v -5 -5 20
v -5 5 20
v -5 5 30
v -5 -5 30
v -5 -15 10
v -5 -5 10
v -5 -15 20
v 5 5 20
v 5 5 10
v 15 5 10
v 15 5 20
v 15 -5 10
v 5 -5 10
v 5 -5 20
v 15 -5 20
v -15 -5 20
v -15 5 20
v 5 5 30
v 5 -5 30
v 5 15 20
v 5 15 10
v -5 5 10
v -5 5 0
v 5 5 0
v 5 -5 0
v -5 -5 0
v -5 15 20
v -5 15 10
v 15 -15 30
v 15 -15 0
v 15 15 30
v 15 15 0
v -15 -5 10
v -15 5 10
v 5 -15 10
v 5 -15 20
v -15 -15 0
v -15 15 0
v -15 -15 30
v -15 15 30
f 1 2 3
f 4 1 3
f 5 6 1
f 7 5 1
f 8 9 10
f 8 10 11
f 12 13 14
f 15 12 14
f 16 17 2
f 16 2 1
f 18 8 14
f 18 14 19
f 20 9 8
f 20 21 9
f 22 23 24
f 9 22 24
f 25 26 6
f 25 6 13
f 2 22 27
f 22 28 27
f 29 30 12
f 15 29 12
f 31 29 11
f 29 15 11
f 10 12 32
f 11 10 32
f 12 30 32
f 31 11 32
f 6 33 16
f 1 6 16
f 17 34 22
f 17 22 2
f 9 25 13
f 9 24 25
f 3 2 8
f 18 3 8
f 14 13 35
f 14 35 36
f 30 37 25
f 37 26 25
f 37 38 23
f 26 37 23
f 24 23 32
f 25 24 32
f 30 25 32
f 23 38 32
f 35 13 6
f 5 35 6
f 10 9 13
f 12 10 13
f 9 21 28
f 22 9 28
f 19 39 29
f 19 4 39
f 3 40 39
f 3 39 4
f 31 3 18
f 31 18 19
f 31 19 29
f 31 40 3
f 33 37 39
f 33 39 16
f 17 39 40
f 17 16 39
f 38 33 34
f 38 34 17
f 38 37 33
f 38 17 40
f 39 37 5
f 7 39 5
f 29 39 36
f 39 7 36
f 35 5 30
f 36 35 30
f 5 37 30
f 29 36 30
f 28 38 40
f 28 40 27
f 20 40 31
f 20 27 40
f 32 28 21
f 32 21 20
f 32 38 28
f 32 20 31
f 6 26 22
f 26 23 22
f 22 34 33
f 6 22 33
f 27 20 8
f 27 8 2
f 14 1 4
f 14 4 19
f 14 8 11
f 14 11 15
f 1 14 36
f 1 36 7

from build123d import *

# Parameters (mm, degrees)
F1_W     = 30
F1_H     = 30
F1_W_2   = 10
F1_H_2   = 10
F2_DEPTH = 30
F3_W     = 10
F3_H     = 10
F4_DEPTH = 30
F5_W     = 10
F5_H     = 10
F6_DEPTH = 30


with BuildPart() as f2:
    # F1 (on Top) → F2 (new body)
    with BuildSketch(Plane.XY):
        Rectangle(F1_W, F1_H)
        Rectangle(F1_W_2, F1_H_2, mode=Mode.SUBTRACT)
    extrude(amount=F2_DEPTH)

    # F3 (on face) → F4 (cut, through all)
    with BuildSketch(Plane(origin=(0, 15, 0), x_dir=(-1, 0, 0), z_dir=(0, 1, 0))):
        with Locations((0, 15)):
            Rectangle(F3_W, F3_H)
    extrude(amount=-F4_DEPTH, mode=Mode.SUBTRACT)

    # F5 (on face) → F6 (cut, through all)
    with BuildSketch(Plane(origin=(-15, 0, 0), x_dir=(0, -1, 0), z_dir=(-1, 0, 0))):
        with Locations((0, 15)):
            Rectangle(F5_W, F5_H)
    extrude(amount=-F6_DEPTH, mode=Mode.SUBTRACT)


solid = f2.part
